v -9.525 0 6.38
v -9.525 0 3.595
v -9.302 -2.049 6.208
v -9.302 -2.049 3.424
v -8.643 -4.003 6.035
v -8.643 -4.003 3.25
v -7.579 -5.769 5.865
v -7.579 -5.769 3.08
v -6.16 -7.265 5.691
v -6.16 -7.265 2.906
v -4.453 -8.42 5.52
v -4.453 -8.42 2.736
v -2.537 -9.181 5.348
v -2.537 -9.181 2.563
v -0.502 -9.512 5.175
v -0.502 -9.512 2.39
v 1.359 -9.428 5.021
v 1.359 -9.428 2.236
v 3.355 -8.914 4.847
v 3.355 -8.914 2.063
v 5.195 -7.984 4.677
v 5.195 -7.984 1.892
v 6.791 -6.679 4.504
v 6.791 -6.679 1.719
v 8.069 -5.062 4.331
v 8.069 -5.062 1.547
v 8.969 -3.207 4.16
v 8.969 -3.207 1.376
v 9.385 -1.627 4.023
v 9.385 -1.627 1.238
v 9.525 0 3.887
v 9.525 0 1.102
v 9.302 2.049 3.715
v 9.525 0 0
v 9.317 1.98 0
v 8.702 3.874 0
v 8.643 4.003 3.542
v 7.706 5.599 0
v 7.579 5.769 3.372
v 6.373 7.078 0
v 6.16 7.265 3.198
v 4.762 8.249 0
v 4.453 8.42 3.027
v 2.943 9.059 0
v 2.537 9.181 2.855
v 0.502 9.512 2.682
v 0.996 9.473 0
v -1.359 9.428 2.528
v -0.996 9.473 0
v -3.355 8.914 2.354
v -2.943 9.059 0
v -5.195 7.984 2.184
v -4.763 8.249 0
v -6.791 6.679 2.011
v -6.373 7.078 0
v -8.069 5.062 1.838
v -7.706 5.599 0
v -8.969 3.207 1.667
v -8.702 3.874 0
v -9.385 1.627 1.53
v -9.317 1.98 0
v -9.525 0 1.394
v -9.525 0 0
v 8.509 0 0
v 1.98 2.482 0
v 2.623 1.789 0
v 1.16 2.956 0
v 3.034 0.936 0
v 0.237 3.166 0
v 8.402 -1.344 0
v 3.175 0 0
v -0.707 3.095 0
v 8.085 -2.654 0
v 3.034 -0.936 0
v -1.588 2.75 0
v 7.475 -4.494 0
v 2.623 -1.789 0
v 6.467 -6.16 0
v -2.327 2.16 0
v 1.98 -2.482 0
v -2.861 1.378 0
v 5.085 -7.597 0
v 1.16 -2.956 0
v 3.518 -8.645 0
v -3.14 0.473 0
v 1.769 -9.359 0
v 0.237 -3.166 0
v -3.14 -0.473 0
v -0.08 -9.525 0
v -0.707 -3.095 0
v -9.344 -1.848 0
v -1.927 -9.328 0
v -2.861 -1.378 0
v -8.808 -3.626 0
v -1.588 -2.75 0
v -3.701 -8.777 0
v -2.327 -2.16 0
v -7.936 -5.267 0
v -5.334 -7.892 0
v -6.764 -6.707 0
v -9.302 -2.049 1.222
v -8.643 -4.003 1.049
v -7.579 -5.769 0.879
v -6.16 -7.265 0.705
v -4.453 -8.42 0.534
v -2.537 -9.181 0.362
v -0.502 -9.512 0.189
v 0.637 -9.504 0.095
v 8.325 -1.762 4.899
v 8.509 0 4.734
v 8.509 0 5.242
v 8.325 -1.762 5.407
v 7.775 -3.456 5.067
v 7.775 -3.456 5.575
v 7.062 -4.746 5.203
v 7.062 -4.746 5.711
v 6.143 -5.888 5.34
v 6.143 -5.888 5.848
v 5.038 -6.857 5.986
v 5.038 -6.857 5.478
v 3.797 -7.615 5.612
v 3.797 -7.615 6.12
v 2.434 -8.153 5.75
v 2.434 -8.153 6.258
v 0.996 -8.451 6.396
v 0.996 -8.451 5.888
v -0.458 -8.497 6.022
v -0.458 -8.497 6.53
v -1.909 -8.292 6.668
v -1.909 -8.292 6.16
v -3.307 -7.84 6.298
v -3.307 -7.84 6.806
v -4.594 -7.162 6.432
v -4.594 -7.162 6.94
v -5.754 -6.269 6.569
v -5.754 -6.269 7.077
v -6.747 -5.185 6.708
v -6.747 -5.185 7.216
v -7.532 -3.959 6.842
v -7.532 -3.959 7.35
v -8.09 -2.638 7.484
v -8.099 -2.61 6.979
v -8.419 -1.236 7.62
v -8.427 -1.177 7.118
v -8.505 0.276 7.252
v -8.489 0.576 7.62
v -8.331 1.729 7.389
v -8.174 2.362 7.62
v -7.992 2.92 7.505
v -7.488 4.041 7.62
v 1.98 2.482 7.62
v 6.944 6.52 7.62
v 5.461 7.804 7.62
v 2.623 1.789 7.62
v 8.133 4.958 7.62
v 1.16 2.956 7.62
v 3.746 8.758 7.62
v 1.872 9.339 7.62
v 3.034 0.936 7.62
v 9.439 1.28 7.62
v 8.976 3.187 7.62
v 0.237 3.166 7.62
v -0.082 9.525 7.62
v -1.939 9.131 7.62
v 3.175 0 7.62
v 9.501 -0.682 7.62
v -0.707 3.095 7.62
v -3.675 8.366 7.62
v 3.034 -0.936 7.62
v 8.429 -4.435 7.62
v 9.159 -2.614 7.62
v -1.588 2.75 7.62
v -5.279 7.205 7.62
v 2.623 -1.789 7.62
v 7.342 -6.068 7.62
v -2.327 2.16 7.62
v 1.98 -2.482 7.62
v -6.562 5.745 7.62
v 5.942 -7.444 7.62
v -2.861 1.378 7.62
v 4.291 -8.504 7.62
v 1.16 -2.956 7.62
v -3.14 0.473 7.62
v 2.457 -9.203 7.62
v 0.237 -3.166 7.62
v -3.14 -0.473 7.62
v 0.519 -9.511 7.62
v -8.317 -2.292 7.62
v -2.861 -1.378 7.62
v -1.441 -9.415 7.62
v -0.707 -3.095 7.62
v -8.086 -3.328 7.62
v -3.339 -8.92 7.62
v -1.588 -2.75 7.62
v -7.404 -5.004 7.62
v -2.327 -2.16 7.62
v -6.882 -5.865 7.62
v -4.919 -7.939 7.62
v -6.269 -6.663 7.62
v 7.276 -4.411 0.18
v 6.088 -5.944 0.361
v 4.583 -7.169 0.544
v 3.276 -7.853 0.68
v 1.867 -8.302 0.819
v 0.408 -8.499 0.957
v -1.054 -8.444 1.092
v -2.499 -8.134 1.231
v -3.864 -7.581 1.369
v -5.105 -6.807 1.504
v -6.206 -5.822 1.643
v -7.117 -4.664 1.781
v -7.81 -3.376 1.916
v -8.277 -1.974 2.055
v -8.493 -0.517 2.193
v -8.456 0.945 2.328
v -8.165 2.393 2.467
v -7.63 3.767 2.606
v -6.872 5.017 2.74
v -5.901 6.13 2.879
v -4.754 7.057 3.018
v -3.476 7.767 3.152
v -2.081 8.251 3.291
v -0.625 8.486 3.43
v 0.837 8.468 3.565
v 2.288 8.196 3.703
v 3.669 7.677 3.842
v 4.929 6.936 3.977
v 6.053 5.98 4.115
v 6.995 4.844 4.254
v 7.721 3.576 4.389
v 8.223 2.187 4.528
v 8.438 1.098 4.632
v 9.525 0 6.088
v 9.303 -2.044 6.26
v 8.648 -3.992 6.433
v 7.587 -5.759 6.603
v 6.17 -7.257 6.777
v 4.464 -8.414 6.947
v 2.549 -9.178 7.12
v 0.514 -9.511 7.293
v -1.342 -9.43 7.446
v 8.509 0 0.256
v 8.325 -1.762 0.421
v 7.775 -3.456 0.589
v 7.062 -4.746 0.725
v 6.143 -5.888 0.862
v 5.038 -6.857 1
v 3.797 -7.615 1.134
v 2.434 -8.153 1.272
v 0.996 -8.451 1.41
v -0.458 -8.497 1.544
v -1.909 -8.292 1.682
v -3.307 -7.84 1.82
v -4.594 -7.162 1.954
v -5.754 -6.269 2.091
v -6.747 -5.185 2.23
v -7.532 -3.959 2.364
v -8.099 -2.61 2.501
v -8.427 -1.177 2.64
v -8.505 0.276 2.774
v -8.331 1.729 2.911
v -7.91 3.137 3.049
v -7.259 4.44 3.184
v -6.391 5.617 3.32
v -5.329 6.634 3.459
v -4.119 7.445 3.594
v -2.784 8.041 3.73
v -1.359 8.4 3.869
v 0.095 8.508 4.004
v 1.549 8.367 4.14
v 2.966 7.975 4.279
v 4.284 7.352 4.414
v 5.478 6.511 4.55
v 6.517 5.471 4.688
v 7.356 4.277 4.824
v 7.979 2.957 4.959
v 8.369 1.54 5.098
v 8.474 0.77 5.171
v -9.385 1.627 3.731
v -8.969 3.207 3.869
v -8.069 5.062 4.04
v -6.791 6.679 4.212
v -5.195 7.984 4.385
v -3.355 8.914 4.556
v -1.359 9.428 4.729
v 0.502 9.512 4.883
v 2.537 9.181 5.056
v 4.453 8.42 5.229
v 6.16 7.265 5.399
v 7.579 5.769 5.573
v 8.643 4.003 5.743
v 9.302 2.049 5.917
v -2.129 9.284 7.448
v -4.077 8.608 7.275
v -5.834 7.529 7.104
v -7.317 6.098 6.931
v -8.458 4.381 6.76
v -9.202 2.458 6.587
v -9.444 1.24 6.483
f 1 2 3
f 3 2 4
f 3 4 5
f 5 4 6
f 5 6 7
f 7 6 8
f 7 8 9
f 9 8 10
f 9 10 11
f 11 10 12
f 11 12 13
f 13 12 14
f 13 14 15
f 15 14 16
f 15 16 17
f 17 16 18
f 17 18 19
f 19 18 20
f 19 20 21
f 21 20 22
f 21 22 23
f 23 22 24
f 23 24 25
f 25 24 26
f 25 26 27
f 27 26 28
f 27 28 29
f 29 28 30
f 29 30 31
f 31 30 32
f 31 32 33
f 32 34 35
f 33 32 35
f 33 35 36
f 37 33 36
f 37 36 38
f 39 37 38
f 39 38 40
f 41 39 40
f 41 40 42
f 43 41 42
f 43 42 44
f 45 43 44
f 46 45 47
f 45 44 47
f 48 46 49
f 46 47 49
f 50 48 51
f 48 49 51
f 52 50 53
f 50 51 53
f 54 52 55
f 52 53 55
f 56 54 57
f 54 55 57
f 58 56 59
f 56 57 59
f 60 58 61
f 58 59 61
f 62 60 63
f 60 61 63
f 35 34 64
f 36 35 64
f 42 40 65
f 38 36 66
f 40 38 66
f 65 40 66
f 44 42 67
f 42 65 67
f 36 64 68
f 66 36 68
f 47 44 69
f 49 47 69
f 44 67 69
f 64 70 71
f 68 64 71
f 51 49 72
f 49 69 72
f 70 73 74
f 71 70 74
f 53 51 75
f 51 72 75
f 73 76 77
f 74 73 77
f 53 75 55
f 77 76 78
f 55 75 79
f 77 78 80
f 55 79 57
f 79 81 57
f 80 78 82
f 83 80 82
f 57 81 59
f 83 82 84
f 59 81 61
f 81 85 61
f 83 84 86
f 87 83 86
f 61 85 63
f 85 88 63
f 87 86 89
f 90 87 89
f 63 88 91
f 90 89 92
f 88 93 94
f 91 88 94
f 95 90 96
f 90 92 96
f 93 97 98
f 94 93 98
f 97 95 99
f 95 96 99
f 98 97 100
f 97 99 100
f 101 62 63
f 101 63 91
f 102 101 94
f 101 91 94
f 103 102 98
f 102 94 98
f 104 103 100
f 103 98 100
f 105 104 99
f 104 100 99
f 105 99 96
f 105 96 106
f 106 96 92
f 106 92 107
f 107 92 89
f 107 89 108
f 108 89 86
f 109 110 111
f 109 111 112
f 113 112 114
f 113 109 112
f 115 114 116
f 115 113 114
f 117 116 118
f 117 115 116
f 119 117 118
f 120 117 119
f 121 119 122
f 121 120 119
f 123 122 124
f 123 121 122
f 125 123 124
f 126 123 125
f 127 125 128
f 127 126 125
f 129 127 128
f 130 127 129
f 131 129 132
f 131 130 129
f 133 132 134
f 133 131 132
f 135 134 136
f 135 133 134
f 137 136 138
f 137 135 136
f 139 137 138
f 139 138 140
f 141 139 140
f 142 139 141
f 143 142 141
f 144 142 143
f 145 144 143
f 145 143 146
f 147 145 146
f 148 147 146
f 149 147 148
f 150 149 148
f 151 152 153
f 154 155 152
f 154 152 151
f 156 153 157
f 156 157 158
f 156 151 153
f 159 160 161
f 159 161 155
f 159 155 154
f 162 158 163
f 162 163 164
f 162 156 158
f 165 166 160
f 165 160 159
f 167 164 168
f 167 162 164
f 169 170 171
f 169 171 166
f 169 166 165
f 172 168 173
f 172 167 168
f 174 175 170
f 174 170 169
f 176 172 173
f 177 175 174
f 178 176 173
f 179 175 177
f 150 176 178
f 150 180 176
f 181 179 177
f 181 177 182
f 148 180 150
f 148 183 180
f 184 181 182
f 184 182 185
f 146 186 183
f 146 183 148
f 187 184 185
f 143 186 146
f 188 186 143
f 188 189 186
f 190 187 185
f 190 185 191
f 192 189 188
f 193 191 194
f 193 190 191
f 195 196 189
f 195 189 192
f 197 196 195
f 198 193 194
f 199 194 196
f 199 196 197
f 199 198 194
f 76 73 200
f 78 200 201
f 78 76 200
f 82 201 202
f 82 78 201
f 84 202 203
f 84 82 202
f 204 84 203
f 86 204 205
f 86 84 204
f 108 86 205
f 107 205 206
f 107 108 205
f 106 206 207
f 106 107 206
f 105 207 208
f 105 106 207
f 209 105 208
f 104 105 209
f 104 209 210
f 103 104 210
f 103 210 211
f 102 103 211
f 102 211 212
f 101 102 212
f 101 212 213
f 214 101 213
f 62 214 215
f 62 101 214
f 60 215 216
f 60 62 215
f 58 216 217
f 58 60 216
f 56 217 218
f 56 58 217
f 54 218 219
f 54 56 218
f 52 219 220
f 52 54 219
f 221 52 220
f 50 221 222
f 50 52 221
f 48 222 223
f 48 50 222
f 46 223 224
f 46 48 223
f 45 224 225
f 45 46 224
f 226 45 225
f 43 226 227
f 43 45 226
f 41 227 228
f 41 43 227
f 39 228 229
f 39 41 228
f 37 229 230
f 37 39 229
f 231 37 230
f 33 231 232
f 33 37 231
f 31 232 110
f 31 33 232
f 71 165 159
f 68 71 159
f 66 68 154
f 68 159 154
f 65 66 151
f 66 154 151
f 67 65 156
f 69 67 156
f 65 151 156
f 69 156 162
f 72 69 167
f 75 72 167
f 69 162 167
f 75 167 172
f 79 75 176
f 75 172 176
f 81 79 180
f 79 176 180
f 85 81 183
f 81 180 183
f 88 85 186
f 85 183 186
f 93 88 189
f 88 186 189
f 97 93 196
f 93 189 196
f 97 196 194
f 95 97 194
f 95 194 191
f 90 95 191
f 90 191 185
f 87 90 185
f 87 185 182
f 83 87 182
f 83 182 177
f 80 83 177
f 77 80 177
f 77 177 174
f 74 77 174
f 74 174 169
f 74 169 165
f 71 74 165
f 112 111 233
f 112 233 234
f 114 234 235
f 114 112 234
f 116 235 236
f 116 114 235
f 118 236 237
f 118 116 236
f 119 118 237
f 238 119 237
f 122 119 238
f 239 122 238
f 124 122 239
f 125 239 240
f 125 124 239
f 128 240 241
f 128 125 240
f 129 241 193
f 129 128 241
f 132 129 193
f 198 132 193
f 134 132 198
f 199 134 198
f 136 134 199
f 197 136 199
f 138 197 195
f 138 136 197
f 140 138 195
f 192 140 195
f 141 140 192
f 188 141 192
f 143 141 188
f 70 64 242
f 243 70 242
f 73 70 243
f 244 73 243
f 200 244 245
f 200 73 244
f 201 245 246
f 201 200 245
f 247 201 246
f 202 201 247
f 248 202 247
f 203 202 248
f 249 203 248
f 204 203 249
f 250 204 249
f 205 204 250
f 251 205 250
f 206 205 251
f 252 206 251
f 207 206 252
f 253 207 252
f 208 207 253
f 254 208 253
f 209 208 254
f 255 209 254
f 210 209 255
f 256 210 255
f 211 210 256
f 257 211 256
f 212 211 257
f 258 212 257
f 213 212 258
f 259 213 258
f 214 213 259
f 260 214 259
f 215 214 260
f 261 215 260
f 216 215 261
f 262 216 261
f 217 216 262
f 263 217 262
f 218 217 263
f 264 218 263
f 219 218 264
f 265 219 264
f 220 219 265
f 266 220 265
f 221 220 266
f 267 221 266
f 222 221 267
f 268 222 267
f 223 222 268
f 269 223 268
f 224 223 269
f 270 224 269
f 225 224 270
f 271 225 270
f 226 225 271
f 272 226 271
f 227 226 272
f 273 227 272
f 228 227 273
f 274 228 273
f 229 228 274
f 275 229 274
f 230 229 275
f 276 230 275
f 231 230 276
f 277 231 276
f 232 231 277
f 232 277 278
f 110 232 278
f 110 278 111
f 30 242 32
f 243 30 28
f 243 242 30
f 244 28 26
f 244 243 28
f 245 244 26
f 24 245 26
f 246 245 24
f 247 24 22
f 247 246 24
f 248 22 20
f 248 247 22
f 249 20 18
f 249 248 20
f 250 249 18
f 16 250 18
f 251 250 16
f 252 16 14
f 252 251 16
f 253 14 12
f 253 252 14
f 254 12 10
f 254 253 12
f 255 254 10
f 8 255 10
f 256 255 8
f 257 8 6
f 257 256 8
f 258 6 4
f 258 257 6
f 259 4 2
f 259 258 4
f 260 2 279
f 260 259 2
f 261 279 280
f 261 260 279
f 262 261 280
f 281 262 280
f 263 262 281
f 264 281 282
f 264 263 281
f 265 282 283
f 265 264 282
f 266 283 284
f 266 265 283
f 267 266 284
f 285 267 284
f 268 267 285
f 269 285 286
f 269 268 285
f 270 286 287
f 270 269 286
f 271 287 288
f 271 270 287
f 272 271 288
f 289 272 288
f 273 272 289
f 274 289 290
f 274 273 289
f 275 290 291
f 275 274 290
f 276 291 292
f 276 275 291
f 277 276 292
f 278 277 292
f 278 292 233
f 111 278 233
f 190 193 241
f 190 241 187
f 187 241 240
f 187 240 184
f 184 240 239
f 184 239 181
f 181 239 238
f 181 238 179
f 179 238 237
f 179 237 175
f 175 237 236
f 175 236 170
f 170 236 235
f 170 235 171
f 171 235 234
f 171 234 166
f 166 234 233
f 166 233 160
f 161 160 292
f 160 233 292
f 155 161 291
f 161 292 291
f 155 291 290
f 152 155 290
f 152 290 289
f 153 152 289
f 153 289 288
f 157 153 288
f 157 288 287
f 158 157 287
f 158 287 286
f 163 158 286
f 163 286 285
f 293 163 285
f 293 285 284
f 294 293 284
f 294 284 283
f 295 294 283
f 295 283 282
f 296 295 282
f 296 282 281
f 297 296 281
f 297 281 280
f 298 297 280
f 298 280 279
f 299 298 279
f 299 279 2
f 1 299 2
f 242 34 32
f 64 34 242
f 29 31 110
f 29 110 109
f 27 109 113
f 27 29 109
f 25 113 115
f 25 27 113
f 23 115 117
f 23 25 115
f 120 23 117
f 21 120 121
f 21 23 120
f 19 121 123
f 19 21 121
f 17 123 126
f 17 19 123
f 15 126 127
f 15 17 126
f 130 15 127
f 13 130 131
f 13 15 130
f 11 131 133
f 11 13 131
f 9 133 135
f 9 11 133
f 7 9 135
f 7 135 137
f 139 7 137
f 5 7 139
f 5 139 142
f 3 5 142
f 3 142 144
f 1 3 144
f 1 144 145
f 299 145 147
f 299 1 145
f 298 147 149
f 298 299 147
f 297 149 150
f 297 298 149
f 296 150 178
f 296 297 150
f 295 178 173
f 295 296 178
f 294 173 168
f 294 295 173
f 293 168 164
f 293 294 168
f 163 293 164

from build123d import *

# Parameters (mm, degrees)
SKETCH1_R           = 9.525
BOSS_EXTRUDE1_DEPTH = 7.62
SKETCH2_R           = 3.175
CUT_EXTRUDE1_DEPTH  = 16.476293161
CUT_SWEEP5_PITCH    = 4.98602


with BuildPart() as part:
    # Sketch1 → Boss-Extrude1 (new body)
    with BuildSketch(Plane.XY):
        with Locations(Location((0, 0, 0), (0, 0, 180))):
            Circle(SKETCH1_R)
    extrude(amount=BOSS_EXTRUDE1_DEPTH)

    # Sketch2 → Cut-Extrude1 (cut, through all)
    with BuildSketch(Plane.XY.offset(7.62)):
        Circle(SKETCH2_R)
    extrude(amount=-CUT_EXTRUDE1_DEPTH, mode=Mode.SUBTRACT)

    # Cut-Sweep5: arcs per turn and ends read off the stored shape
    # Cut-Sweep5: the profile of Sketch6 screwed along a left-hand helix through 2.5 turns, 12 arcs to a turn; built about Z, then put on its axis
    cut_sweep5_z = Axis((0, 0, 0), (0, 0, 1))
    cut_sweep5_corners = [(10.033, 2e-08, -1.522198128), (10.033, 2e-08, 1.525801872), (8.509, 1.7e-08, 0.255801872), (8.509, 1.7e-08, -0.252198128)]
    with BuildLine(mode=Mode.PRIVATE) as cut_sweep5_profile:
        Line(cut_sweep5_corners[0], cut_sweep5_corners[1])
        Line(cut_sweep5_corners[1], cut_sweep5_corners[2])
        Line(cut_sweep5_corners[2], cut_sweep5_corners[3])
        Line(cut_sweep5_corners[3], cut_sweep5_corners[0])
    cut_sweep5_cap = Face(cut_sweep5_profile.wire())
    cut_sweep5_turn_angles = [0, -15, -30, -45, -60, -75, -90, -105, -120, -135, -150, -165, -180, -195, -210, -225, -240, -255, -270, -285, -300, -315, -330, -345, -360]
    cut_sweep5_turn_weights = [1, 0.9659258262890683, 1, 0.9659258262890683, 1, 0.9659258262890683, 1, 0.9659258262890683, 1, 0.9659258262890683, 1, 0.9659258262890683, 1, 0.9659258262890683, 1, 0.9659258262890683, 1, 0.9659258262890683, 1, 0.9659258262890683, 1, 0.9659258262890683, 1, 0.9659258262890683, 1]
    cut_sweep5_turn_rails = [Edge.make_bspline([Vector(p[0], p[1], 0).rotate(cut_sweep5_z, cut_sweep5_turn_angles[k]) / cut_sweep5_turn_weights[k] + Vector(0, 0, p[2] + -CUT_SWEEP5_PITCH * cut_sweep5_turn_angles[k] / 360) for k in range(25)], [0, 0, 0, 1, 1, 2, 2, 3, 3, 4, 4, 5, 5, 6, 6, 7, 7, 8, 8, 9, 9, 10, 10, 11, 11, 12, 12, 12], 2, cut_sweep5_turn_weights) for p in cut_sweep5_corners]
    cut_sweep5_turn_sides = [Face.make_surface_from_curves(cut_sweep5_turn_rails[p[0]], cut_sweep5_turn_rails[p[1]]) for p in [(0, 1), (1, 2), (2, 3), (3, 0)]]
    cut_sweep5_last_angles = [-720, -735, -750, -765, -780, -795, -810, -825, -840, -855, -870, -885, -900]
    cut_sweep5_last_weights = [1, 0.9659258262890683, 1, 0.9659258262890683, 1, 0.9659258262890683, 1, 0.9659258262890683, 1, 0.9659258262890683, 1, 0.9659258262890683, 1]
    cut_sweep5_last_rails = [Edge.make_bspline([Vector(p[0], p[1], 0).rotate(cut_sweep5_z, cut_sweep5_last_angles[k]) / cut_sweep5_last_weights[k] + Vector(0, 0, p[2] + -CUT_SWEEP5_PITCH * cut_sweep5_last_angles[k] / 360) for k in range(13)], [0, 0, 0, 1, 1, 2, 2, 3, 3, 4, 4, 5, 5, 6, 6, 6], 2, cut_sweep5_last_weights) for p in cut_sweep5_corners]
    cut_sweep5_last_sides = [Face.make_surface_from_curves(cut_sweep5_last_rails[p[0]], cut_sweep5_last_rails[p[1]]) for p in [(0, 1), (1, 2), (2, 3), (3, 0)]]
    cut_sweep5 = Plane(origin=(0, 0, 0), x_dir=(1, 0, 0), z_dir=(0, 0, 1)) * Solid(Shell([*[p.moved(Location((0, 0, CUT_SWEEP5_PITCH * i))) for i in range(2) for p in cut_sweep5_turn_sides], *cut_sweep5_last_sides, cut_sweep5_cap, cut_sweep5_cap.rotate(cut_sweep5_z, -900).moved(Location((0, 0, -CUT_SWEEP5_PITCH * -900 / 360)))]))
    add(cut_sweep5, mode=Mode.SUBTRACT)


solid = part.part
